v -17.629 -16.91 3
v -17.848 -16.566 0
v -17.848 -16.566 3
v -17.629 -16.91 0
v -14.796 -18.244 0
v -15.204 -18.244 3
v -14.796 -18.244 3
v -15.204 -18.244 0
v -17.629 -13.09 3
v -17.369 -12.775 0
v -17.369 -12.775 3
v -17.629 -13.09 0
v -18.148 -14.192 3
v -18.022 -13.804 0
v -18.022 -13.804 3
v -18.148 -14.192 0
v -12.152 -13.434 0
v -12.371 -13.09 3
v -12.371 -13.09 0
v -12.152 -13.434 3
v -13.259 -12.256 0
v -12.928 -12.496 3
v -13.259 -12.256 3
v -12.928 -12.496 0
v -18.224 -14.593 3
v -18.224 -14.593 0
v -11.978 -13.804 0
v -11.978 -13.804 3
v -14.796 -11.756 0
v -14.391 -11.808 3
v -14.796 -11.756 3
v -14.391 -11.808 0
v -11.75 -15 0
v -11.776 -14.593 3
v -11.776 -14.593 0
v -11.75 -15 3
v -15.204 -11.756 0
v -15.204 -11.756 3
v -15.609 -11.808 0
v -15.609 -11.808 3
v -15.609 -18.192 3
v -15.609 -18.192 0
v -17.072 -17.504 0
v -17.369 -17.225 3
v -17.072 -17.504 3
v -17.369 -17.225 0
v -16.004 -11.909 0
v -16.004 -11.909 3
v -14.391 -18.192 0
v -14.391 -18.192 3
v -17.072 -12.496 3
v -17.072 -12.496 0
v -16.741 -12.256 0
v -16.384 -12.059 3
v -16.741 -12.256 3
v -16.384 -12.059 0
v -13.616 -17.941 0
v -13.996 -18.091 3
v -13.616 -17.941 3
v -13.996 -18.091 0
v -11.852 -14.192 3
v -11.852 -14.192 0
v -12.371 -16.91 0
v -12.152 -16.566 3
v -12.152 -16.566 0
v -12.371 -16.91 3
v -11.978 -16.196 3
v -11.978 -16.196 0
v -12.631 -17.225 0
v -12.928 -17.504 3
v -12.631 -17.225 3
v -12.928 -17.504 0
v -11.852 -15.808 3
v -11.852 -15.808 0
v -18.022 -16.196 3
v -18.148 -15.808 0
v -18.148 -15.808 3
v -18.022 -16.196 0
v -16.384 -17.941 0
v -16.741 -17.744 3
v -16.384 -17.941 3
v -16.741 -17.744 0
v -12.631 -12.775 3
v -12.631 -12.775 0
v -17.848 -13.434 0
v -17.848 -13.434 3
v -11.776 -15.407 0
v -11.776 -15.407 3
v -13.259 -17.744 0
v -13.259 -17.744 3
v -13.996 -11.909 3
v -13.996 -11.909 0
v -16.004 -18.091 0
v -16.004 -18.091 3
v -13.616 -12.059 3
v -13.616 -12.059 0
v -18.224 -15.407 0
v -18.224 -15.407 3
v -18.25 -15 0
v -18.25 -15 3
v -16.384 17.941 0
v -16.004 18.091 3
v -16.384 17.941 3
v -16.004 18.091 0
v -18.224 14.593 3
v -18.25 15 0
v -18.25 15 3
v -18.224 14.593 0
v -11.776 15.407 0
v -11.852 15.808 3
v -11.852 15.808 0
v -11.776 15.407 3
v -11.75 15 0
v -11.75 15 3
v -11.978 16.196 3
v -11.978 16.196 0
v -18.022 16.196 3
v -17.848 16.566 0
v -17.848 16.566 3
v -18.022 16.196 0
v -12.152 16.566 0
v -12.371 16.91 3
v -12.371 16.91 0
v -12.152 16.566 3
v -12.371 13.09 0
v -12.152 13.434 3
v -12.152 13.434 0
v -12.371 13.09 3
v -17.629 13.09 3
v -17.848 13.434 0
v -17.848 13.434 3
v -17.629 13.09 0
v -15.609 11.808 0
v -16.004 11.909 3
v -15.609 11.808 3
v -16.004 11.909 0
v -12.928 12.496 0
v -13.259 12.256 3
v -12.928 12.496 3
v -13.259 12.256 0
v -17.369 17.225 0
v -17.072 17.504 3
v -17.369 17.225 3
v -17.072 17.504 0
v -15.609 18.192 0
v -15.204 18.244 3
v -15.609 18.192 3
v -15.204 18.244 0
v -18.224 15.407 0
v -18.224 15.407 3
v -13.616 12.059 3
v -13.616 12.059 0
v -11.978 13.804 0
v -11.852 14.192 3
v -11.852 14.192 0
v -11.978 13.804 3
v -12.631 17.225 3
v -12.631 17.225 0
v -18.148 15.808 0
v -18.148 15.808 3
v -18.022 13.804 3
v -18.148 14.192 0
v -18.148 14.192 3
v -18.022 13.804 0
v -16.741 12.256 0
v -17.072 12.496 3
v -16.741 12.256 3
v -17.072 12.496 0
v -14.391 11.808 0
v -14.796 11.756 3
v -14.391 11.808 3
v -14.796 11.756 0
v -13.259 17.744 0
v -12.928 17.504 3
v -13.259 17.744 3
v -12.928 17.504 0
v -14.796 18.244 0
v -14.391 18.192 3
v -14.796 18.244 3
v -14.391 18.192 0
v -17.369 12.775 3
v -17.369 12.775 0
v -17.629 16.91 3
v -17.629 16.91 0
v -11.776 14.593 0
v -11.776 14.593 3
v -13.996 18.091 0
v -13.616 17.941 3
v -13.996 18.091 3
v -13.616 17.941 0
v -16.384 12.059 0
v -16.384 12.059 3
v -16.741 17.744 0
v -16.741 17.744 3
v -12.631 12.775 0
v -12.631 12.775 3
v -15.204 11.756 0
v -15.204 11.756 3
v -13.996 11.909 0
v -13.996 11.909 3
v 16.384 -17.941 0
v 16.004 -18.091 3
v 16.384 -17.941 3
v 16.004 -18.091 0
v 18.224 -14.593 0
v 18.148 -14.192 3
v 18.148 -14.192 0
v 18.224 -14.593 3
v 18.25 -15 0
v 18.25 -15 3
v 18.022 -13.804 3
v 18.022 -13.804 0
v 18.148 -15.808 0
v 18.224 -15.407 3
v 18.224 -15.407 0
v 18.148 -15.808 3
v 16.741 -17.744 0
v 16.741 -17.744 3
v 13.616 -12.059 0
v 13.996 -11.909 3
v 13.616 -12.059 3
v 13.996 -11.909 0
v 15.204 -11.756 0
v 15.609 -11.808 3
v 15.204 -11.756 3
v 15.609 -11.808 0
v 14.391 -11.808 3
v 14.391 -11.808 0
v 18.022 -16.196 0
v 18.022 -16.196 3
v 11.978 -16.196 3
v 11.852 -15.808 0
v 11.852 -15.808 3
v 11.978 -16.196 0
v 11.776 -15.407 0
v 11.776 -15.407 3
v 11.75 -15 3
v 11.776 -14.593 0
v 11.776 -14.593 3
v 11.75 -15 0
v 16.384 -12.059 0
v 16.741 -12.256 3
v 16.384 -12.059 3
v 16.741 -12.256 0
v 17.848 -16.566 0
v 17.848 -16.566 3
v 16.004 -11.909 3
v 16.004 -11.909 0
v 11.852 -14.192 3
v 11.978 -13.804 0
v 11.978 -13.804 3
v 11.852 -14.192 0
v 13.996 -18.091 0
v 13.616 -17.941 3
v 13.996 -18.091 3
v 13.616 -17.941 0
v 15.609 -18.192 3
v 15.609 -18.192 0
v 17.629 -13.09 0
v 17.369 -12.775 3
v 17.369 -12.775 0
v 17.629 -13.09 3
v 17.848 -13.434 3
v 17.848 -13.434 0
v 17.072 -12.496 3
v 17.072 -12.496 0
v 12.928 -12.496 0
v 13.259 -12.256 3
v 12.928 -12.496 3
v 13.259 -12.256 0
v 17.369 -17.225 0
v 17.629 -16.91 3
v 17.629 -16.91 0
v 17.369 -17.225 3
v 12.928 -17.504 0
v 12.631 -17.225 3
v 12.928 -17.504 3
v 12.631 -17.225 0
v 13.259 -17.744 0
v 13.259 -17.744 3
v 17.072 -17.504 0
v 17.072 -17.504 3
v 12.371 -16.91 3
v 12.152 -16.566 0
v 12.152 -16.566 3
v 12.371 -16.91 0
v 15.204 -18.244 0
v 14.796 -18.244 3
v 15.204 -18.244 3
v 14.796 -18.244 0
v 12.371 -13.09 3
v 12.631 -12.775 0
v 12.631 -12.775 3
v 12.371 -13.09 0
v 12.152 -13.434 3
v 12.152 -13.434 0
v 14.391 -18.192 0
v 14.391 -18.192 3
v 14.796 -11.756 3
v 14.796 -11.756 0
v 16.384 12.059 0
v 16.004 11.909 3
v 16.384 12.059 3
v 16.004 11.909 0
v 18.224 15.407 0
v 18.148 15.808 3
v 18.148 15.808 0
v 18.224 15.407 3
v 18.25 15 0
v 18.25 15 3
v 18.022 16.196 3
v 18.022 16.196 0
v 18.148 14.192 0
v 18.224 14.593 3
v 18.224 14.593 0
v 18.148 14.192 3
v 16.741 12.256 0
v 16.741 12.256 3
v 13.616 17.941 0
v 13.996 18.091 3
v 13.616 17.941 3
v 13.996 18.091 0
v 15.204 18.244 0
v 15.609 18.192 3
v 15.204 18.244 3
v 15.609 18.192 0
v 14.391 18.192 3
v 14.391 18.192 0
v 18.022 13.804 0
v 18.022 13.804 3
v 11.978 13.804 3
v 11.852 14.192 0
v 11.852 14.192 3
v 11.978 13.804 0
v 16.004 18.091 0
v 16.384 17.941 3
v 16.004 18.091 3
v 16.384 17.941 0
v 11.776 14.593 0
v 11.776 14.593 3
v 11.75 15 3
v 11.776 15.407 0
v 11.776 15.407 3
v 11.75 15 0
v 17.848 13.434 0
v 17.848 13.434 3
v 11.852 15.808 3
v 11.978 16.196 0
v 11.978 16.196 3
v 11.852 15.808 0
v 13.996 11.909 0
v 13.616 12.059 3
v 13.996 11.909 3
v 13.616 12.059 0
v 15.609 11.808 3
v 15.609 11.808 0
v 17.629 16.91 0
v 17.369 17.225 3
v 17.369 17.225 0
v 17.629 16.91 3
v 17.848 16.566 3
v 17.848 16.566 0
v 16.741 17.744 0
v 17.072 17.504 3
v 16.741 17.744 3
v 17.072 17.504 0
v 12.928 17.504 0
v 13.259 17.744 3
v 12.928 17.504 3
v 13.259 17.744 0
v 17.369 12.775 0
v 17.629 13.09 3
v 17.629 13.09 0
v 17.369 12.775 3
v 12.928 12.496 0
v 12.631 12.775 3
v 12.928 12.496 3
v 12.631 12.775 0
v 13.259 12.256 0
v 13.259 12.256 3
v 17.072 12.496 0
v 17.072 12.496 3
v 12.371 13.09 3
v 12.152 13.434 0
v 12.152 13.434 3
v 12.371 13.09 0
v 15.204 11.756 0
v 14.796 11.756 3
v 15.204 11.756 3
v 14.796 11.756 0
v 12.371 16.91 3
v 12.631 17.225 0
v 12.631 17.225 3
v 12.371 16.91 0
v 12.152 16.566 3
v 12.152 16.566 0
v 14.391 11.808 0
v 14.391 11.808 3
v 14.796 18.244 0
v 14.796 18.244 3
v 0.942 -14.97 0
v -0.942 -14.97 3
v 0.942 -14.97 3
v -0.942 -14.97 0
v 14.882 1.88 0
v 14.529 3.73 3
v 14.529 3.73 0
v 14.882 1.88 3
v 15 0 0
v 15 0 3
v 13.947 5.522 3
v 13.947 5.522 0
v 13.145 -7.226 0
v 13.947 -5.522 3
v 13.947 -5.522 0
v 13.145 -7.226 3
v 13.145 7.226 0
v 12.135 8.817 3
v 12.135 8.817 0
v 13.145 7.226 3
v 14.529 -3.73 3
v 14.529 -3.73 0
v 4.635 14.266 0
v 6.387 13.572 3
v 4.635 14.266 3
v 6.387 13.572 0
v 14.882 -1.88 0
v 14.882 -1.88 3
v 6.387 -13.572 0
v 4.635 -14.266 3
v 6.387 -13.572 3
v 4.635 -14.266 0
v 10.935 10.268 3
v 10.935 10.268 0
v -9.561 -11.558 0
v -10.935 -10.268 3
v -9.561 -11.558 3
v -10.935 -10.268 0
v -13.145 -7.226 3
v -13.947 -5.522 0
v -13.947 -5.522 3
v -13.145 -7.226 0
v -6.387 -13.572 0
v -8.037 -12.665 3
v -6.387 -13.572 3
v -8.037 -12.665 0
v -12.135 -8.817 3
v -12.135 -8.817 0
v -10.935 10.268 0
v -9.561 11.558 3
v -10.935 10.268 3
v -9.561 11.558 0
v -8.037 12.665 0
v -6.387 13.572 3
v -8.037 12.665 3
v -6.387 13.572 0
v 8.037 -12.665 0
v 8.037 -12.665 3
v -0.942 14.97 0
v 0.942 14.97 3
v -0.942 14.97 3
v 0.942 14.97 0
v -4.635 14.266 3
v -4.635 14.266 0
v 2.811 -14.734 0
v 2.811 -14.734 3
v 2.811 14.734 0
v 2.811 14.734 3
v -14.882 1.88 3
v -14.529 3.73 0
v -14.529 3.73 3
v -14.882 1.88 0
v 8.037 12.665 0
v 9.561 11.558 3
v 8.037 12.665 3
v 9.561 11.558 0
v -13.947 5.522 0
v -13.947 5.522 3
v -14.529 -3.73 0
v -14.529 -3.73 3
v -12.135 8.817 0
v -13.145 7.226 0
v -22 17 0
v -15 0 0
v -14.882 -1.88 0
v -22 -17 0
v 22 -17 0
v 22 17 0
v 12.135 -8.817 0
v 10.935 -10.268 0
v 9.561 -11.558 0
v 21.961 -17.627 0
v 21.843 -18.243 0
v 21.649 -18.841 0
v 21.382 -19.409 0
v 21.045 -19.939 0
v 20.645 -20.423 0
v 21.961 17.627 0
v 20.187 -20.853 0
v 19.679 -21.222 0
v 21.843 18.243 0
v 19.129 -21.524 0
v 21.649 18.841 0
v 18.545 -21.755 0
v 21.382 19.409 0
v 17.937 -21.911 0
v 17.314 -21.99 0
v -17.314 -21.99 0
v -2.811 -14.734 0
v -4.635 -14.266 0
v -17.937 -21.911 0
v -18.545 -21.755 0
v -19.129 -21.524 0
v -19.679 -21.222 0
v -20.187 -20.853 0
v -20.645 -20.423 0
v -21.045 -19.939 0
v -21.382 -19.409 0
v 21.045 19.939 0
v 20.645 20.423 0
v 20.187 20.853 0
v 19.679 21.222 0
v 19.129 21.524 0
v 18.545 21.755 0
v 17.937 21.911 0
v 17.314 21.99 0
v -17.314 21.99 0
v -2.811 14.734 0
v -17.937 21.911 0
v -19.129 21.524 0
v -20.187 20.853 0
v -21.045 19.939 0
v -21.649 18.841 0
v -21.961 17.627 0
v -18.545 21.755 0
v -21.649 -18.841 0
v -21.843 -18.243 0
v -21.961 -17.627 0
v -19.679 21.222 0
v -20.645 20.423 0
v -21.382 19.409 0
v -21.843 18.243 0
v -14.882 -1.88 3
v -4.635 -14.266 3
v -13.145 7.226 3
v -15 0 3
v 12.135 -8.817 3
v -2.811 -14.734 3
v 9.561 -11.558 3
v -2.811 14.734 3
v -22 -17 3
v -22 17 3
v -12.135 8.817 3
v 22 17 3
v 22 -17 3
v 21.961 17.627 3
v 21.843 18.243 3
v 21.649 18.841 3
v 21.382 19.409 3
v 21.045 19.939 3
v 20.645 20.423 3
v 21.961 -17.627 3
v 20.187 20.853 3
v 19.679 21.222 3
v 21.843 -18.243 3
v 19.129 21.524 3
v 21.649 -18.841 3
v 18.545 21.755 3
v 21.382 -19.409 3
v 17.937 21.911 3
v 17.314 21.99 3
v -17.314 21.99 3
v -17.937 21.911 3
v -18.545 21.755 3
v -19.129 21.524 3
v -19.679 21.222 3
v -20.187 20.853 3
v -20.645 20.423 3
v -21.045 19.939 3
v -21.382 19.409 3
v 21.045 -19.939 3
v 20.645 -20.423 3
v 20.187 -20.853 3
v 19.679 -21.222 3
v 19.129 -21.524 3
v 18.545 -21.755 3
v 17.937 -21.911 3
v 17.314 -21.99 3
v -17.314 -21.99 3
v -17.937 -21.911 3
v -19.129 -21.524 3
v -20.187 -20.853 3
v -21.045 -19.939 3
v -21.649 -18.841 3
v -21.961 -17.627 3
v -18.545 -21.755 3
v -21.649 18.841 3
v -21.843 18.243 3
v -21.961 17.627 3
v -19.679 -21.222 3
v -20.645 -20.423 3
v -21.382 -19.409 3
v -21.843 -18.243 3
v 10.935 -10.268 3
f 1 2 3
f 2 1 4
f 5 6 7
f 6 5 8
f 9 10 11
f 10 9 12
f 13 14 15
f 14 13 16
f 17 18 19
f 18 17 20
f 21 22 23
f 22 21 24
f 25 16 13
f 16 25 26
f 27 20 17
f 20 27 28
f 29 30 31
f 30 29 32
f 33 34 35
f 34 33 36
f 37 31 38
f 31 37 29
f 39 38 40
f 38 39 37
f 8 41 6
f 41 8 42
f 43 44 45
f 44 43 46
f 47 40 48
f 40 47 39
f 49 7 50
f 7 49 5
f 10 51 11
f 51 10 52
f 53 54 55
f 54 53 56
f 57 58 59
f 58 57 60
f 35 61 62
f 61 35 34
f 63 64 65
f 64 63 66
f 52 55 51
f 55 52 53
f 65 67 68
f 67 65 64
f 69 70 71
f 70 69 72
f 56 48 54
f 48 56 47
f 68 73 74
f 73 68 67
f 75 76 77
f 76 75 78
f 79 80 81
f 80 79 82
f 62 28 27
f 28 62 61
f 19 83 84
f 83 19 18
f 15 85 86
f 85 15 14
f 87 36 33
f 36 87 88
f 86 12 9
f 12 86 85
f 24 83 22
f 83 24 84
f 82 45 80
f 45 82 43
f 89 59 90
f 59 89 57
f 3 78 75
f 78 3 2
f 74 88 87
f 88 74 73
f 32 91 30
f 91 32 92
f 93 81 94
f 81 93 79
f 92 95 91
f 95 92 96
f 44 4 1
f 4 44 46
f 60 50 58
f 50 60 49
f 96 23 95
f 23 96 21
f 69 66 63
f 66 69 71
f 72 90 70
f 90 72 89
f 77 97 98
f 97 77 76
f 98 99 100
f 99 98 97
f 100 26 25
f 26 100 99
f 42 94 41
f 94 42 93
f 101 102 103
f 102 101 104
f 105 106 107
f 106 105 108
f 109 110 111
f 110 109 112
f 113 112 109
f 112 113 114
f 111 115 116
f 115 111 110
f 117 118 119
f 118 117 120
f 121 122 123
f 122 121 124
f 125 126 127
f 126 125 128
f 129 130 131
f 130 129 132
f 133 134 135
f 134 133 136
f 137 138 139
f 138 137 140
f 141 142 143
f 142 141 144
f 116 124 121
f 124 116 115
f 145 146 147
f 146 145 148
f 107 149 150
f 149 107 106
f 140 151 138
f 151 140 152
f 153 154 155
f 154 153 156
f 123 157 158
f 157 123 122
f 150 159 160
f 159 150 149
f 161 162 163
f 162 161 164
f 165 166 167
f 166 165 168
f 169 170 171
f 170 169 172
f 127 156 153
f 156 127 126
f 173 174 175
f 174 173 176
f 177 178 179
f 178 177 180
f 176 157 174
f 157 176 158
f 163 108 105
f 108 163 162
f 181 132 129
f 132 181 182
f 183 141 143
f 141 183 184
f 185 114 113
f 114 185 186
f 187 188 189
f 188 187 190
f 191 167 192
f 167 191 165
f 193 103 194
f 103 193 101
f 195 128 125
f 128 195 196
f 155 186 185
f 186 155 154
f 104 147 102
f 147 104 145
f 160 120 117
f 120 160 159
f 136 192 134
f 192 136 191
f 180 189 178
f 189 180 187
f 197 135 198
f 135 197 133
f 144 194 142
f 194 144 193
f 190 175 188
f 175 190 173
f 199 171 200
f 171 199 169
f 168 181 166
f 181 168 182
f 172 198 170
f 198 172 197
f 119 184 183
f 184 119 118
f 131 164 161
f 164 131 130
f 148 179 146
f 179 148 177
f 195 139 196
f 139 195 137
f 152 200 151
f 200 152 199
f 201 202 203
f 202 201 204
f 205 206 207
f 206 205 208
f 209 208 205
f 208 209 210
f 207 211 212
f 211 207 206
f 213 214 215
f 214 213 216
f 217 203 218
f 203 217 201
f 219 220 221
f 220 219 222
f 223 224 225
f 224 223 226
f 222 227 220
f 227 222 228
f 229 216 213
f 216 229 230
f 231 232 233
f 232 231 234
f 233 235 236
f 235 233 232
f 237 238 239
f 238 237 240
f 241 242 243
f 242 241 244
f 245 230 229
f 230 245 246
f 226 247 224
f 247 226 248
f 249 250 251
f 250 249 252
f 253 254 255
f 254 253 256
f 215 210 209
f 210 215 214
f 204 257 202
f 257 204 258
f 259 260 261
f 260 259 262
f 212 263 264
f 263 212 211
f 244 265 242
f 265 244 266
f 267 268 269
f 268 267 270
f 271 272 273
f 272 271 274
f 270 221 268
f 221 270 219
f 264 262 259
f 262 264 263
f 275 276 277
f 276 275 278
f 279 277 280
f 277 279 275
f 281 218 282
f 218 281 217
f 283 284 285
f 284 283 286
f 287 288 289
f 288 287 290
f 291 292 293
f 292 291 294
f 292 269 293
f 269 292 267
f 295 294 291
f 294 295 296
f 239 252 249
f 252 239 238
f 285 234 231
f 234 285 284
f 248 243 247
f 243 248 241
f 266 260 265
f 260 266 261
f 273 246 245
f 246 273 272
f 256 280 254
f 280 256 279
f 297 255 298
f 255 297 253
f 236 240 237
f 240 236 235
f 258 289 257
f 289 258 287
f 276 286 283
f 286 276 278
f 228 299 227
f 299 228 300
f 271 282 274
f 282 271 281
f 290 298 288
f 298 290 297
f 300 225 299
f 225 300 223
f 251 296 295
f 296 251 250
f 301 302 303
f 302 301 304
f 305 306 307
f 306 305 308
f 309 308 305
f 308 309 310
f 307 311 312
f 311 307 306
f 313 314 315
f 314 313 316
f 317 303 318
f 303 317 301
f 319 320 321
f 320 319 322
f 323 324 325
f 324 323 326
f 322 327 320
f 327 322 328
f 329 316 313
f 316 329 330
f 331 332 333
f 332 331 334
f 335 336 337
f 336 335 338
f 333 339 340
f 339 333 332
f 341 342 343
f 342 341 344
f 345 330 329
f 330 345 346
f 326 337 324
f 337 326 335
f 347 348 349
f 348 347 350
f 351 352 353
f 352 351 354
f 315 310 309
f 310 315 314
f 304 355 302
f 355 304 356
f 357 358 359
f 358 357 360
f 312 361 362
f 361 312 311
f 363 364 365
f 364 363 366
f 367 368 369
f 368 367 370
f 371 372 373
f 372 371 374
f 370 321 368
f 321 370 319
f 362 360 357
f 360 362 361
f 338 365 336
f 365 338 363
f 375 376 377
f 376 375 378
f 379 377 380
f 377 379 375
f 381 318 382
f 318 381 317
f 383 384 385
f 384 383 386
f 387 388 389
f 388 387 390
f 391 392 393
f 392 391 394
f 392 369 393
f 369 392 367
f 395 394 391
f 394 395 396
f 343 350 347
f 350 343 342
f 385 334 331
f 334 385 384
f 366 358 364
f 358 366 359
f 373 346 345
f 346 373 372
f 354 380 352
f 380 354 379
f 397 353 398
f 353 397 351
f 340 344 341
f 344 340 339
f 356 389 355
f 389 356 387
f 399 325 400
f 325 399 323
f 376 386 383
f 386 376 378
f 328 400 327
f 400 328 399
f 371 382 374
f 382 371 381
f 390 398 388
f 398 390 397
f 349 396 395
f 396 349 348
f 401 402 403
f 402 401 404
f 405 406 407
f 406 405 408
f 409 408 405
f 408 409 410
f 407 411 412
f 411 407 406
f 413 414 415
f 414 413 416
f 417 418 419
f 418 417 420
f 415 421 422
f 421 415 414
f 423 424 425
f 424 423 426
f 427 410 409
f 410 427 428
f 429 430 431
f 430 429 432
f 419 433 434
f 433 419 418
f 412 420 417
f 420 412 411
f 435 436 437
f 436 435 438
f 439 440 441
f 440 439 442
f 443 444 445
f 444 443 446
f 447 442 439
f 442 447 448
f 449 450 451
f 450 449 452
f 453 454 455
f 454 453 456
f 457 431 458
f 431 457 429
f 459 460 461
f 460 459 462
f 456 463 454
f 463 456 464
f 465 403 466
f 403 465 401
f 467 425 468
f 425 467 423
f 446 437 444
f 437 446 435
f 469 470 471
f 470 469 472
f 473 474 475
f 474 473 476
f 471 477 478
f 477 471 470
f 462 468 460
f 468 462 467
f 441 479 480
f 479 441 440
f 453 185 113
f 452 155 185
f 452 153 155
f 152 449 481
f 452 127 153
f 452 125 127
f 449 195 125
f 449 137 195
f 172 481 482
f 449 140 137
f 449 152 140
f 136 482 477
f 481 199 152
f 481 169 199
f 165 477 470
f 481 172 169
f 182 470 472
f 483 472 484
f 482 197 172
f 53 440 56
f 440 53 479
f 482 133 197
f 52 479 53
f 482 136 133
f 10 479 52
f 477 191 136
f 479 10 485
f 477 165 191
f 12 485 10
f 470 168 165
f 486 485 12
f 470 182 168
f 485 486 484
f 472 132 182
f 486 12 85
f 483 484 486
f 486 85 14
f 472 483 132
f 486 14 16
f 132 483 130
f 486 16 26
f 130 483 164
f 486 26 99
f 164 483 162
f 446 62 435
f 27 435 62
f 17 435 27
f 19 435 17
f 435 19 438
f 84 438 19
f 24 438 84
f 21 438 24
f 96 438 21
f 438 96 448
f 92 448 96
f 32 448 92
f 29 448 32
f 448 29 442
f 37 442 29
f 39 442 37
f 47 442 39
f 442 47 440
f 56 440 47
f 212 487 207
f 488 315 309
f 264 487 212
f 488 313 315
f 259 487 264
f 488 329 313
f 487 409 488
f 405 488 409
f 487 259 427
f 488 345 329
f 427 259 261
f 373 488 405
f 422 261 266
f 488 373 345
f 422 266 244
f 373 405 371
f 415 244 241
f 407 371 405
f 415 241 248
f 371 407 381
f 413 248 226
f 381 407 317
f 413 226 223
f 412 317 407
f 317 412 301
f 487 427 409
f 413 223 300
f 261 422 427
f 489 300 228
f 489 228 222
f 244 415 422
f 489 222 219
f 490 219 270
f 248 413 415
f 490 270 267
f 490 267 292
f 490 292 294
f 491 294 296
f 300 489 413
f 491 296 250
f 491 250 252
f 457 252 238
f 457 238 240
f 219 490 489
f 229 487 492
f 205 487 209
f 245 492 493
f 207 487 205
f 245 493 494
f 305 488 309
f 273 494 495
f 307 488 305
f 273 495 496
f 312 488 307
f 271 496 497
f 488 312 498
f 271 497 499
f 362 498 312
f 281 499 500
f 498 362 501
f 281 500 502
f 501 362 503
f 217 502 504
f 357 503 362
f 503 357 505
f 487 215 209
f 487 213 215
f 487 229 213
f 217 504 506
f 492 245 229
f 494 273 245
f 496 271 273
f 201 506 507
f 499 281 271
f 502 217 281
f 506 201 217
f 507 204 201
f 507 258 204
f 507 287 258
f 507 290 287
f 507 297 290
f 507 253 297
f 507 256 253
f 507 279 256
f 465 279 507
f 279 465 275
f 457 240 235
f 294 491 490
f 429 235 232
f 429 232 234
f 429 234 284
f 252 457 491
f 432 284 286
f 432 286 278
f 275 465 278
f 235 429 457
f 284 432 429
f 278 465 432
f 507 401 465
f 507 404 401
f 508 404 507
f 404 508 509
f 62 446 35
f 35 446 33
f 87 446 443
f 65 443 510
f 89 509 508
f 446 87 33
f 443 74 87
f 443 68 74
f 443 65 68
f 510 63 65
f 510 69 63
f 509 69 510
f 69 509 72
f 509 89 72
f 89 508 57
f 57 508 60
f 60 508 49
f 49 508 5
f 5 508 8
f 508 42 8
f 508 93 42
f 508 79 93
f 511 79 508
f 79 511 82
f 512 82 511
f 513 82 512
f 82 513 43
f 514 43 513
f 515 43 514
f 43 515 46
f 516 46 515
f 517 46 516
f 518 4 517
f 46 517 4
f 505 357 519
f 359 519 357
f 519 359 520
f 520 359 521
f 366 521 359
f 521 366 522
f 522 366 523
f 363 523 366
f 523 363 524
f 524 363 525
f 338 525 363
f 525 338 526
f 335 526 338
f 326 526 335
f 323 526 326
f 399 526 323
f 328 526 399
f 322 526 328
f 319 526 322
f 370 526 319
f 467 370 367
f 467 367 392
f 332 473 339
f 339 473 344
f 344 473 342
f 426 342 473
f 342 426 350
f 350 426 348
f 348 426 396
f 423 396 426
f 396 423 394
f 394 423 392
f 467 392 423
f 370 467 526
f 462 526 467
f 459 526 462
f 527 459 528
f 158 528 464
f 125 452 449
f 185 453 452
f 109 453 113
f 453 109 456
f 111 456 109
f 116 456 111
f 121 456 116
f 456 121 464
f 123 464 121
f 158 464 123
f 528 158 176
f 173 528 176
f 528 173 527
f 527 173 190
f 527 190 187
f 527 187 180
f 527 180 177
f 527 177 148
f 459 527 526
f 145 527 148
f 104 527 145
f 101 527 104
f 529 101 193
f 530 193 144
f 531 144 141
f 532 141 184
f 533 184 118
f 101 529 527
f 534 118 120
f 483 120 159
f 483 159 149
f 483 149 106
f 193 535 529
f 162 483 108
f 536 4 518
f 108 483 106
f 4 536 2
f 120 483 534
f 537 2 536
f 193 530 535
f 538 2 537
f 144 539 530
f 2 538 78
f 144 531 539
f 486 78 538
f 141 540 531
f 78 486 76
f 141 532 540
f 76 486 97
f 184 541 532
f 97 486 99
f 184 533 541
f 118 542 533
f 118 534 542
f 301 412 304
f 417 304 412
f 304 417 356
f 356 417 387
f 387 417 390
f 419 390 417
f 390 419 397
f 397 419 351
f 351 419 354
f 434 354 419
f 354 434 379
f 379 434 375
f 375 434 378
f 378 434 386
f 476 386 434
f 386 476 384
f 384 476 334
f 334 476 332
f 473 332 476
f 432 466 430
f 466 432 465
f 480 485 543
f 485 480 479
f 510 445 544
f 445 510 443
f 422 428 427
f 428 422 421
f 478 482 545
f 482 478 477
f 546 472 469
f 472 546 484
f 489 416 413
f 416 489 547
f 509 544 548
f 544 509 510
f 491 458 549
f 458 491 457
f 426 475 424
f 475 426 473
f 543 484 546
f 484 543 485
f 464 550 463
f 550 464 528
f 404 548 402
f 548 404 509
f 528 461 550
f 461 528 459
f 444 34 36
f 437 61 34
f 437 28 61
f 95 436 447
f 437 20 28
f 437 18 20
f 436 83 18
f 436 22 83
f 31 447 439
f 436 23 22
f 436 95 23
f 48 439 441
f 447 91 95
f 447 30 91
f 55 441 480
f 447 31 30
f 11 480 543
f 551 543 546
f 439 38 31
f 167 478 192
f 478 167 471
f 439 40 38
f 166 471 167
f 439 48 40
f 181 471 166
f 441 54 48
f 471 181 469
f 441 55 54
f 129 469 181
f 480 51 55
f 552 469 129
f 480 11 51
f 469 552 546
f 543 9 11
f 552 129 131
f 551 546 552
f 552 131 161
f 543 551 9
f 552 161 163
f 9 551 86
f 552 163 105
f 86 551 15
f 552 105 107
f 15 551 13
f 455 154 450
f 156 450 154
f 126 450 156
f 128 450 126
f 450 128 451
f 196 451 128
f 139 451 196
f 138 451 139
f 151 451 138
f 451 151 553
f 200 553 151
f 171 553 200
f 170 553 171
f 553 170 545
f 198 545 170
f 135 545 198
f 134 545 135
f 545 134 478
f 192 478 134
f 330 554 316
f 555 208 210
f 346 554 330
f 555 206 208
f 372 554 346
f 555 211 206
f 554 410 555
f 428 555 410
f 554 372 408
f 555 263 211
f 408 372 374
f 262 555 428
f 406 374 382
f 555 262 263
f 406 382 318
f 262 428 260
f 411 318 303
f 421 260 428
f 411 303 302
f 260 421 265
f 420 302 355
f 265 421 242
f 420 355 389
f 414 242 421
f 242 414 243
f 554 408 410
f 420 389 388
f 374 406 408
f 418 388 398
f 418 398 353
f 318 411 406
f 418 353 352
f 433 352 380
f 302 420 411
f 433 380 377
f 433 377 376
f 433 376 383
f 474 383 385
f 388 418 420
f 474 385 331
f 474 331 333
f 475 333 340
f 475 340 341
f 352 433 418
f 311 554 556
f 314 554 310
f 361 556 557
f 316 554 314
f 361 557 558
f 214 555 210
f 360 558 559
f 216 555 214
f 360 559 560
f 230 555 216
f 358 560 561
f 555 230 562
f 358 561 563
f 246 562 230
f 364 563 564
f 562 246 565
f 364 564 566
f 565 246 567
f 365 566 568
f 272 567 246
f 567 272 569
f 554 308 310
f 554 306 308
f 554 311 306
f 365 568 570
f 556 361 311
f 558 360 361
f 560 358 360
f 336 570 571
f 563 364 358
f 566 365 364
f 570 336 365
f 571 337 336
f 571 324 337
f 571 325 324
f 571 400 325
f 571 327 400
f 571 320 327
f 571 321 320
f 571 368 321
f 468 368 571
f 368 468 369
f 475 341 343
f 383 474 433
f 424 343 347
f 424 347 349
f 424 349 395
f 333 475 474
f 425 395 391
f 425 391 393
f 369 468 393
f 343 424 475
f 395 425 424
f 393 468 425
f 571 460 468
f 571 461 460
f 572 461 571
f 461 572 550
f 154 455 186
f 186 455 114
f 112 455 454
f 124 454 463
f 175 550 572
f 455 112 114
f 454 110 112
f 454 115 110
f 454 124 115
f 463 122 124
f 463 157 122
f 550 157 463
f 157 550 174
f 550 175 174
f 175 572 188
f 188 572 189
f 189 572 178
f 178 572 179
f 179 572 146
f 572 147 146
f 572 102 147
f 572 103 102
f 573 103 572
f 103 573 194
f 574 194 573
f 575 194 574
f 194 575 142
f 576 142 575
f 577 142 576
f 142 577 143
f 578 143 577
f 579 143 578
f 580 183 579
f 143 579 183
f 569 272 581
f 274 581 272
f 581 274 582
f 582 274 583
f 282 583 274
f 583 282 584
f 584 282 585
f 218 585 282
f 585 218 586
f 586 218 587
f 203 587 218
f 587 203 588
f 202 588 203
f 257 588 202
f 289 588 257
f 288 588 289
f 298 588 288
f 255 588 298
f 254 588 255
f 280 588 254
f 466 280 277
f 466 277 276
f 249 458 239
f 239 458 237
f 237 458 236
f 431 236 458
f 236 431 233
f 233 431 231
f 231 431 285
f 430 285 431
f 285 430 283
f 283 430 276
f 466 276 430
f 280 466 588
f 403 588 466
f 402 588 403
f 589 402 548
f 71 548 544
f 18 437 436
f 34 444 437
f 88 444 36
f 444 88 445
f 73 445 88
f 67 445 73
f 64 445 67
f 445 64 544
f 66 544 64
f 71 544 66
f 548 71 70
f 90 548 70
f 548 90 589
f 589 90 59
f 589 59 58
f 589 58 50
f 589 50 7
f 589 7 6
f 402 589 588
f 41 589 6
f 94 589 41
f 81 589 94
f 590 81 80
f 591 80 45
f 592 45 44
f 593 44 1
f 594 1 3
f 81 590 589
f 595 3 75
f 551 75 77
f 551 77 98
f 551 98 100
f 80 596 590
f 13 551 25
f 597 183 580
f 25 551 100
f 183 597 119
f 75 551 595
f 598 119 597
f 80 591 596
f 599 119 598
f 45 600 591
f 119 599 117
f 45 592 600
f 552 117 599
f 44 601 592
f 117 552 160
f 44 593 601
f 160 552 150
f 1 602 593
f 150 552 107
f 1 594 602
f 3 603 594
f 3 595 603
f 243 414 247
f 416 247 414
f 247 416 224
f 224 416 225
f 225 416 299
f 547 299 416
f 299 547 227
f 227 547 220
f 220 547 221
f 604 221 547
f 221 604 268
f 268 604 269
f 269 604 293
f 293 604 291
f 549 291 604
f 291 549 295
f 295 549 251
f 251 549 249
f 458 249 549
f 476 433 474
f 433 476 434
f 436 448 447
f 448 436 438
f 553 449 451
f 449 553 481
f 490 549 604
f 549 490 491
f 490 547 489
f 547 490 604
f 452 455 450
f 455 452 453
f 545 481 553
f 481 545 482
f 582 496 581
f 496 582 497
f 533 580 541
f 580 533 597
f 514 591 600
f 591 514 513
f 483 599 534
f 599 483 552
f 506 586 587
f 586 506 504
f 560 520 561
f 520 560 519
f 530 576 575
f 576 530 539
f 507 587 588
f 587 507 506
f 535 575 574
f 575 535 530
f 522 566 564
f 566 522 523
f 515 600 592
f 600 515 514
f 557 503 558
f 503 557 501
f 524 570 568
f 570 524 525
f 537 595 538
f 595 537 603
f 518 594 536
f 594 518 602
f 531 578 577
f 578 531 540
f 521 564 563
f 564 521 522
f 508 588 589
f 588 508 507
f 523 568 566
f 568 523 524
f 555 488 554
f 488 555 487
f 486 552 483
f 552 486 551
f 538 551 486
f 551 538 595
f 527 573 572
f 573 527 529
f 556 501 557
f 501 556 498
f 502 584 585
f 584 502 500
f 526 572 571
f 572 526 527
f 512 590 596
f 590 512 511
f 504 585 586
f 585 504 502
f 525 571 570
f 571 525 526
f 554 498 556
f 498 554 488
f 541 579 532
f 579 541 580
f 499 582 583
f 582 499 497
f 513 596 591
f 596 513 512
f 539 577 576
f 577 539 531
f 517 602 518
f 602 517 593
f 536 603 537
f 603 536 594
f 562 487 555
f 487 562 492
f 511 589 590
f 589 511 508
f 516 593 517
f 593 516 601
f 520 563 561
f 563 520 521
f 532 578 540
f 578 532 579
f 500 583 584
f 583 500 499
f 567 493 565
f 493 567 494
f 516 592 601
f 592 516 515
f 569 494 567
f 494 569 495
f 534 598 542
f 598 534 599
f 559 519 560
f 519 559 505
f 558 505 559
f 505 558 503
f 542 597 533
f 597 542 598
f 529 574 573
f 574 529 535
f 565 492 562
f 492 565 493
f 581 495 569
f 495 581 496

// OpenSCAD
$fn = 50;


difference() {
	union() {
		hull() {
			translate(v = [-17.0000000000, 17.0000000000, 0]) {
				cylinder(h = 3, r = 5);
			}
			translate(v = [17.0000000000, 17.0000000000, 0]) {
				cylinder(h = 3, r = 5);
			}
			translate(v = [-17.0000000000, -17.0000000000, 0]) {
				cylinder(h = 3, r = 5);
			}
			translate(v = [17.0000000000, -17.0000000000, 0]) {
				cylinder(h = 3, r = 5);
			}
		}
	}
	union() {
		#translate(v = [-15.0000000000, -15.0000000000, -100.0000000000]) {
			cylinder(h = 200, r = 3.2500000000);
		}
		#translate(v = [-15.0000000000, 15.0000000000, -100.0000000000]) {
			cylinder(h = 200, r = 3.2500000000);
		}
		#translate(v = [15.0000000000, -15.0000000000, -100.0000000000]) {
			cylinder(h = 200, r = 3.2500000000);
		}
		#translate(v = [15.0000000000, 15.0000000000, -100.0000000000]) {
			cylinder(h = 200, r = 3.2500000000);
		}
		#cylinder(h = 3, r = 15.0000000000);
	}
}
